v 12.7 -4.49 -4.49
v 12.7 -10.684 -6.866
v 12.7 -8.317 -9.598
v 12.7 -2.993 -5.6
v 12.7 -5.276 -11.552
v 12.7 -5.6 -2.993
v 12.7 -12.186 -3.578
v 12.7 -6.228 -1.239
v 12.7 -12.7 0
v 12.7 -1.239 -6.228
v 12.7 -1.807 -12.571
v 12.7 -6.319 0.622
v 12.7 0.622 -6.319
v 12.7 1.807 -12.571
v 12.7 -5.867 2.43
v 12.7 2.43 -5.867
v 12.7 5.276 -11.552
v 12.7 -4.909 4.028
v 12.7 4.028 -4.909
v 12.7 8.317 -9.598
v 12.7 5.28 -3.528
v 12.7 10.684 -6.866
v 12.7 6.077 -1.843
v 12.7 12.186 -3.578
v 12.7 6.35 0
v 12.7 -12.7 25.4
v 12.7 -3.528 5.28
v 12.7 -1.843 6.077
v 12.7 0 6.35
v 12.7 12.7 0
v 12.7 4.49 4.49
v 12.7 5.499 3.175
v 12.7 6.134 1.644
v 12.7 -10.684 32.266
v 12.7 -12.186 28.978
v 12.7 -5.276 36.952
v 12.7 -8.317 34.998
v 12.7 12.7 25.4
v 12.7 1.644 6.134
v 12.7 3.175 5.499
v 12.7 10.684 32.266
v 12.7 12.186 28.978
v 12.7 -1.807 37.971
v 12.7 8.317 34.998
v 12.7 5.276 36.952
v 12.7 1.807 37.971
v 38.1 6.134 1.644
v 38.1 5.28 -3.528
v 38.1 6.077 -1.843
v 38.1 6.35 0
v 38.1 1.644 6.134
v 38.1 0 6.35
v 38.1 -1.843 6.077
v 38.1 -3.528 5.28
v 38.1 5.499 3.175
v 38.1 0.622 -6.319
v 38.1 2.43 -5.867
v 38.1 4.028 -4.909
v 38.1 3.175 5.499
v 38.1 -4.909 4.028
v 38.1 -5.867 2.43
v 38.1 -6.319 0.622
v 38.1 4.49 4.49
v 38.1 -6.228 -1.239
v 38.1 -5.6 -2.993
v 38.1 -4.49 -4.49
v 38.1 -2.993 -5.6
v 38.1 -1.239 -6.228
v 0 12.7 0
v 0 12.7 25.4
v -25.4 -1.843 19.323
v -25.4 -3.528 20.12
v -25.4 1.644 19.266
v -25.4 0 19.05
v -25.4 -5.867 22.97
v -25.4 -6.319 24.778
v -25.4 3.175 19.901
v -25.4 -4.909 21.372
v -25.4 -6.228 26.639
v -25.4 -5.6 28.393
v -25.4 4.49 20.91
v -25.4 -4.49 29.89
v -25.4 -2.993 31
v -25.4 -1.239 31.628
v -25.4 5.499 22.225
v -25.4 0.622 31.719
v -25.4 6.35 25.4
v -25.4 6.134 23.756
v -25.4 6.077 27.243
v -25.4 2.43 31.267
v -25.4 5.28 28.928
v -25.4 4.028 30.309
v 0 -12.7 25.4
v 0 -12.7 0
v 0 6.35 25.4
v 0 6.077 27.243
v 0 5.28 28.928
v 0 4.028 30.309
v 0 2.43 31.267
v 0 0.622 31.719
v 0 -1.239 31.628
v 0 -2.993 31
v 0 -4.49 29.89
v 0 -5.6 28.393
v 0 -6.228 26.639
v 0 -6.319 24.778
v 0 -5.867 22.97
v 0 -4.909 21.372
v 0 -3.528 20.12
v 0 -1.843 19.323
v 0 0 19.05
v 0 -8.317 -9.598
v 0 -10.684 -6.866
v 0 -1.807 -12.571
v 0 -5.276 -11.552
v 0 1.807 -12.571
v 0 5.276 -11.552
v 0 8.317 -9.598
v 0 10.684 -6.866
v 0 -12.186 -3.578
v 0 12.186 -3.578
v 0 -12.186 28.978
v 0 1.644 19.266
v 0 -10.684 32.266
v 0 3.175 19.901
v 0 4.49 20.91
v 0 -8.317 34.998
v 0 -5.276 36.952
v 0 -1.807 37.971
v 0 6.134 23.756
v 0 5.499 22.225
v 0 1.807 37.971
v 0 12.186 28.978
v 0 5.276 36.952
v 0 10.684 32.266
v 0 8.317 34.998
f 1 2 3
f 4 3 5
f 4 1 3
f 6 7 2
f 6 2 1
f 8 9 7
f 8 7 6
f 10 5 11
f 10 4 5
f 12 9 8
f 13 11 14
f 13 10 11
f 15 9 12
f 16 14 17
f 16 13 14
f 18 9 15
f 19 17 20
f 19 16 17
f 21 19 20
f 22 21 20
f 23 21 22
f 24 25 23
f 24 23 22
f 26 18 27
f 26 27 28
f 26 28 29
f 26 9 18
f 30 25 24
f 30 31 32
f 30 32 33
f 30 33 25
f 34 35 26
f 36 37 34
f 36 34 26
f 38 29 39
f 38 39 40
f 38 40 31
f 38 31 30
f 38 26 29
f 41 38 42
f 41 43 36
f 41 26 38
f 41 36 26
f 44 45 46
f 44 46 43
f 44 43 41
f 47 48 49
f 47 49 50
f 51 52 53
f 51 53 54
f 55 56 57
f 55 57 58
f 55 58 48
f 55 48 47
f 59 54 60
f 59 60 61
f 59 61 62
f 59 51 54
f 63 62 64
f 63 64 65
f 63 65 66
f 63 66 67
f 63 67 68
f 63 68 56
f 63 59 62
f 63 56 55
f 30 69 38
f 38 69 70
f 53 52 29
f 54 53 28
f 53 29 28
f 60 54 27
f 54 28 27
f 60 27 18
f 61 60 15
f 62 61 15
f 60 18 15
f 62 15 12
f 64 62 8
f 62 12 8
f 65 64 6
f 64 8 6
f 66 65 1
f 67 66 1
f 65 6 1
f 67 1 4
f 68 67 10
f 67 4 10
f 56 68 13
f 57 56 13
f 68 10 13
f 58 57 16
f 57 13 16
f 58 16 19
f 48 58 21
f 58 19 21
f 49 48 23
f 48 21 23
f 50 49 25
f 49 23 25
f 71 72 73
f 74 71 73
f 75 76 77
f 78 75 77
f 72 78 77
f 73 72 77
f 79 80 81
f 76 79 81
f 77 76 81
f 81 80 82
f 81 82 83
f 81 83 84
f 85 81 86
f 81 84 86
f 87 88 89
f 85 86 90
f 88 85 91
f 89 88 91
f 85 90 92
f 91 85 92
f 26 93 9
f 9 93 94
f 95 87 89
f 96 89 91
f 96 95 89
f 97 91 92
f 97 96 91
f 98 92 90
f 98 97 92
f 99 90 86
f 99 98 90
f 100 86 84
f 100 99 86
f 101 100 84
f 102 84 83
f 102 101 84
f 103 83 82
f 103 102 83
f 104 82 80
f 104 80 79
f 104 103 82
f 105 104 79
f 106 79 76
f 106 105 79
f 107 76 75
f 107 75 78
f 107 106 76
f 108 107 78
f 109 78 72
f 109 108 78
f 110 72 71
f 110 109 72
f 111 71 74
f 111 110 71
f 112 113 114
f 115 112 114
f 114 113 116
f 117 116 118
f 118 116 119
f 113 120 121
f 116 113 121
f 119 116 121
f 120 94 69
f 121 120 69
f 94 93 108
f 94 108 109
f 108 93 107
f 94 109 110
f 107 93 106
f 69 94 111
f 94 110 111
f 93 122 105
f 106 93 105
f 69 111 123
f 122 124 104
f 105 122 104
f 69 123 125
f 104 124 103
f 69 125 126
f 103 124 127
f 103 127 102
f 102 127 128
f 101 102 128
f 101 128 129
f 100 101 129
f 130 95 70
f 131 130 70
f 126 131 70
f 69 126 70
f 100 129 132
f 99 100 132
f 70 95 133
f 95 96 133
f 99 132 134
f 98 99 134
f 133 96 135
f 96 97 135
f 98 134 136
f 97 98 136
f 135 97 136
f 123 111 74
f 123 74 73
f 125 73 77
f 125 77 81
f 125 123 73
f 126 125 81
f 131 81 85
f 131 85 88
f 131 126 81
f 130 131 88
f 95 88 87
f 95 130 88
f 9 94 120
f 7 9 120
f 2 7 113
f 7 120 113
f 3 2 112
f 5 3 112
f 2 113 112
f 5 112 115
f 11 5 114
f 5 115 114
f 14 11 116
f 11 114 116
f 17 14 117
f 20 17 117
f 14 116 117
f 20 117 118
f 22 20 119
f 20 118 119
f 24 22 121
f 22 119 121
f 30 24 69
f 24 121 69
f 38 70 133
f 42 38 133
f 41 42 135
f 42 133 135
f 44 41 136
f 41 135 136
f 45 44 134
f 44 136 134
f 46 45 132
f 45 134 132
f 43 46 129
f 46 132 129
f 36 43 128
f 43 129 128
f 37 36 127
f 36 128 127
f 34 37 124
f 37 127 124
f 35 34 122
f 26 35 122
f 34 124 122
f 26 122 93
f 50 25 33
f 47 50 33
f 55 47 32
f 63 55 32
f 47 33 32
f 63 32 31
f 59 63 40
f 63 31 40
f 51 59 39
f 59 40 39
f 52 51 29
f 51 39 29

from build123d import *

# Parameters (mm, degrees)
F1_DEPTH      = 12.7
F2_DEPTH      = 38.1
F3_DEPTH      = 25.4
F3_DEPTH_BACK = 12.7


with BuildPart() as f1:
    # F0 (on Right) → F1 (new body)
    with BuildSketch(Plane.YZ):
        with BuildLine():
            ThreePointArc((12.7, 25.4), (0, 38.1), (-12.7, 25.4))
            Line((-12.7, 25.4), (-12.7, 0))
            ThreePointArc((-12.7, 0), (0, -12.7), (12.7, 0))
            Line((12.7, 0), (12.7, 25.4))
        make_face()
        with BuildLine():
            ThreePointArc((0, 6.35), (4.4901280605, 4.4901280605), (6.35, 0))
            ThreePointArc((6.35, 0), (-4.4901280605, -4.4901280605), (0, 6.35))
        make_face(mode=Mode.SUBTRACT)
        with BuildLine():
            ThreePointArc((6.35, 25.4), (4.4901280605, 20.9098719395), (0, 19.05))
            ThreePointArc((0, 19.05), (-4.4901280605, 29.8901280605), (6.35, 25.4))
        make_face(mode=Mode.SUBTRACT)
    extrude(amount=F1_DEPTH)

    # F0 (on Right) → F2 (join)
    with BuildSketch(Plane.YZ):
        with BuildLine():
            ThreePointArc((0, 6.35), (-4.4901280605, -4.4901280605), (6.35, 0))
            ThreePointArc((6.35, 0), (4.4901280605, 4.4901280605), (0, 6.35))
        make_face()
    extrude(amount=F2_DEPTH)

    # F0 (on Right) → F3 (join, two sides)
    with BuildSketch(Plane.YZ) as f3_sk:
        with BuildLine():
            ThreePointArc((6.35, 25.4), (-4.4901280605, 29.8901280605), (0, 19.05))
            ThreePointArc((0, 19.05), (4.4901280605, 20.9098719395), (6.35, 25.4))
        make_face()
    extrude(amount=-F3_DEPTH)
    extrude(f3_sk.sketch, amount=F3_DEPTH_BACK)


solid = f1.part
